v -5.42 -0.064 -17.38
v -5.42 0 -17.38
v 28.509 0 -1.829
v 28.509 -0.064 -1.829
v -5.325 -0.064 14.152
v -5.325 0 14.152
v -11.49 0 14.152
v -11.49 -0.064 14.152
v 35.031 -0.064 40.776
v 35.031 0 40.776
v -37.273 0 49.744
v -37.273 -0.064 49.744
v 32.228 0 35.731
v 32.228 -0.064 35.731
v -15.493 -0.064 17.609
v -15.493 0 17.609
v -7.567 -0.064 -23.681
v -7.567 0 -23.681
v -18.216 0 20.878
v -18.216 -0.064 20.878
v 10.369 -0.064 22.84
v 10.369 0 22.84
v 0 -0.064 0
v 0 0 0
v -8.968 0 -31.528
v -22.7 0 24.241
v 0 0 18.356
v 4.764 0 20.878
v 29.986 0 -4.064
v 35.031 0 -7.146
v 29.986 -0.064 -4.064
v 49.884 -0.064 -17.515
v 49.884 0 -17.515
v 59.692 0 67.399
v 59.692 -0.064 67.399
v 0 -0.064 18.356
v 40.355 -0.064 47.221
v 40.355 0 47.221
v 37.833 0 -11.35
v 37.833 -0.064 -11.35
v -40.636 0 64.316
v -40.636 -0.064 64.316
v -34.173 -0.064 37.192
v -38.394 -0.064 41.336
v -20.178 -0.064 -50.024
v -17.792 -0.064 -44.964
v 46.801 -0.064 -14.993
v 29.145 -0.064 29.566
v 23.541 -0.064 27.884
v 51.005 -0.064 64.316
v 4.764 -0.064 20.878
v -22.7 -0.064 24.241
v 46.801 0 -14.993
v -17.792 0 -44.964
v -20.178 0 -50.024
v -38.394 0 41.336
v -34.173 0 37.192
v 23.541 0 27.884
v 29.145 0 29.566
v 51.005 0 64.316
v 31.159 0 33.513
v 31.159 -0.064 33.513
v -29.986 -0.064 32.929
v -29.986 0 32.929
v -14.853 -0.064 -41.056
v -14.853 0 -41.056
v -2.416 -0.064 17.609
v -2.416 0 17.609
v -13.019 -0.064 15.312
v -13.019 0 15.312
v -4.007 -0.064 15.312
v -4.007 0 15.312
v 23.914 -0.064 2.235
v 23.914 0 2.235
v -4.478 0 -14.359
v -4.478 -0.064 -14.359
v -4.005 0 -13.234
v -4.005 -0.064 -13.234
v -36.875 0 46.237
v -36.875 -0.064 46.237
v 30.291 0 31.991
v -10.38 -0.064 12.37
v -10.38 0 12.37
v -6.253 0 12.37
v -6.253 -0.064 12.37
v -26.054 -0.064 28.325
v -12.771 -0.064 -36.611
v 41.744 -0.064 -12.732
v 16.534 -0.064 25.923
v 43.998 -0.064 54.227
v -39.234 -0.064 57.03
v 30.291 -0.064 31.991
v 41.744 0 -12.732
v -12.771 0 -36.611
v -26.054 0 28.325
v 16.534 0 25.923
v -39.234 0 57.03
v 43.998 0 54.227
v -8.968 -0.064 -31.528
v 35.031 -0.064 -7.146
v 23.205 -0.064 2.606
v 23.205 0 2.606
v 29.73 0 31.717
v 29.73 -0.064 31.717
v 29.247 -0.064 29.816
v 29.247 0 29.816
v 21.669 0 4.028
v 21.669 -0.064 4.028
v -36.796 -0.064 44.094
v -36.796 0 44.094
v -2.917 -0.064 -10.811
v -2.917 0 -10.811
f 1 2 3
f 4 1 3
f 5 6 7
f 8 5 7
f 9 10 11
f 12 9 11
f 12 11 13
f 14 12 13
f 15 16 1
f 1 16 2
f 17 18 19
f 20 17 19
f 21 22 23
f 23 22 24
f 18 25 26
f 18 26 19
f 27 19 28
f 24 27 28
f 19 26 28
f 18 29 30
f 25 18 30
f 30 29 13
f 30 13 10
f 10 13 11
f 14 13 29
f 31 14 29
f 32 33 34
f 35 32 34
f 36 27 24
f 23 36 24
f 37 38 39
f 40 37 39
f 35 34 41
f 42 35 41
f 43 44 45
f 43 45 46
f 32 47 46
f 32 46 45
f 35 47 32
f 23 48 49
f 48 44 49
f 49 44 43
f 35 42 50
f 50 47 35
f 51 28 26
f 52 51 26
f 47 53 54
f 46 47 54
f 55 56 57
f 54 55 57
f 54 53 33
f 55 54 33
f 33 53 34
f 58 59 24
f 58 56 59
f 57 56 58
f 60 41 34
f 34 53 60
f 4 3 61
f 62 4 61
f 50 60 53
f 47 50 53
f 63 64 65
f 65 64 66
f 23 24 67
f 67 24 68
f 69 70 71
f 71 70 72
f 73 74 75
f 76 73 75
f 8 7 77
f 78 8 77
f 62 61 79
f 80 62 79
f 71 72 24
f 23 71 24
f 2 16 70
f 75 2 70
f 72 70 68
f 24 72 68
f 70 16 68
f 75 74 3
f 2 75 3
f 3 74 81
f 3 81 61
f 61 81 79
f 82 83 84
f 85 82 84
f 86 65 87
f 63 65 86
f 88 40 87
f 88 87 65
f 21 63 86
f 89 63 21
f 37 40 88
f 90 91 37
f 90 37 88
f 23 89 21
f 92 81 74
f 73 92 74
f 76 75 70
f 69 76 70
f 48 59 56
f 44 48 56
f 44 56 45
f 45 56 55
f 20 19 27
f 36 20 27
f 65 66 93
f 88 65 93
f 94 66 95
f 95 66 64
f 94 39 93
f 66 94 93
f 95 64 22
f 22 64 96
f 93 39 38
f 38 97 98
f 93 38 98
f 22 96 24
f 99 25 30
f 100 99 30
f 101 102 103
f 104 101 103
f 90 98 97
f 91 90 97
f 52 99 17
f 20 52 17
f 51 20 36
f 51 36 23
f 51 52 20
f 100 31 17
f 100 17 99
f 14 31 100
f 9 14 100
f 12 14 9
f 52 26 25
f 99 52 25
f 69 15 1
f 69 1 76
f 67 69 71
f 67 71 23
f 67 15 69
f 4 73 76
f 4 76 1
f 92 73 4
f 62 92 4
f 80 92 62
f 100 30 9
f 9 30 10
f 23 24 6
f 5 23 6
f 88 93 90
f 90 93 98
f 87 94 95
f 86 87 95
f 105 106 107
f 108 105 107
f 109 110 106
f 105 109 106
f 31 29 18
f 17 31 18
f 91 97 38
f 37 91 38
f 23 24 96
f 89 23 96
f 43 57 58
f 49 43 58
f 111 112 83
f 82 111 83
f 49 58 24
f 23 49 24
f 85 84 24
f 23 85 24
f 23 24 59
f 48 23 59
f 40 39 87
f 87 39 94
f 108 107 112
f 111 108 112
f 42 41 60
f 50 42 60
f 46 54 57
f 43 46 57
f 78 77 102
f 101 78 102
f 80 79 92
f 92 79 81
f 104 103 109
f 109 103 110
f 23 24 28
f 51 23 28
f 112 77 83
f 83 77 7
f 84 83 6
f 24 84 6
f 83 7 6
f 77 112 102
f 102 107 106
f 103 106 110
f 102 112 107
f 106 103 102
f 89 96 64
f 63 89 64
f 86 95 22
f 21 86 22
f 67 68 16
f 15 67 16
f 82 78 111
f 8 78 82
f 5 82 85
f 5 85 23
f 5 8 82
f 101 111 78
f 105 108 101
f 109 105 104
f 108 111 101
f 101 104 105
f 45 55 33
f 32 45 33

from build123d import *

# Parameters (mm, degrees)
F1_DEPTH = 0.0635
F3_DEPTH = 0.0635
F5_DEPTH = 0.0635
F7_DEPTH = 0.0635
F9_DEPTH = 0.0635


with BuildPart() as f1:
    # F0 (on Front) → F1 (new body)
    with BuildSketch(Plane.XZ):
        Polygon((23.540596, 27.884398), (0, 0), (29.145498, 29.565867), (-38.393591, 41.336168), (-20.177653, -50.023768), (49.883641, -17.515324), (59.692226, 67.398965), (-40.635552, 64.316273), (51.004622, 64.316273), (46.800945, -14.993117), (-17.792404, -44.964434), (-34.173226, 37.191691), align=None)
    extrude(amount=F1_DEPTH)


with BuildPart() as f3:
    # F2 (on Front) → F3 (new body)
    with BuildSketch(Plane.XZ):
        Polygon((43.998495, 54.227445), (-39.234325, 57.029895), (40.355306, 47.22131), (37.833102, -11.349929), (-12.771325, -36.611153), (-26.053793, 28.325355), (10.369072, 22.839984), (0, 0), (16.534466, 25.92268), (-29.986234, 32.92881), (-14.852995, -41.055918), (41.743974, -12.731862), align=None)
    extrude(amount=F3_DEPTH)


with BuildPart() as f5:
    # F4 (on Front) → F5 (new body)
    with BuildSketch(Plane.XZ):
        Polygon((35.030652, 40.775675), (-37.27261, 49.743518), (32.228198, 35.73126), (29.986233, -4.063555), (-7.566621, -23.680719), (-18.215938, 20.878267), (0, 18.356059), (0, 0), (4.764169, 20.878267), (-22.699861, 24.241209), (-8.967847, -31.527583), (35.030652, -7.146252), align=None)
    extrude(amount=F5_DEPTH)


with BuildPart() as f7:
    # F6 (on Front) → F7 (new body)
    with BuildSketch(Plane.XZ):
        Polygon((31.159258, 33.51336), (-36.875419, 46.236731), (30.290611, 31.991135), (23.914007, 2.235083), (-4.477515, -14.358898), (-13.019102, 15.311877), (-4.006716, 15.311877), (0, 0), (-2.416296, 17.609153), (-15.493091, 17.609153), (-5.420425, -17.380111), (28.508557, -1.829327), align=None)
    extrude(amount=F7_DEPTH)


with BuildPart() as f9:
    # F8 (on Front) → F9 (new body)
    with BuildSketch(Plane.XZ):
        Polygon((29.729899, 31.716872), (-36.796261, 44.093836), (29.246654, 29.816469), (21.668965, 4.028412), (-2.91659, -10.810725), (-10.38006, 12.369939), (-6.2532, 12.369939), (0, 0), (-5.324659, 14.152383), (-11.490052, 14.152383), (-4.005074, -13.234315), (23.204867, 2.606219), align=None)
    extrude(amount=F9_DEPTH)


solid = Compound([f1.part, f3.part, f5.part, f7.part, f9.part])
